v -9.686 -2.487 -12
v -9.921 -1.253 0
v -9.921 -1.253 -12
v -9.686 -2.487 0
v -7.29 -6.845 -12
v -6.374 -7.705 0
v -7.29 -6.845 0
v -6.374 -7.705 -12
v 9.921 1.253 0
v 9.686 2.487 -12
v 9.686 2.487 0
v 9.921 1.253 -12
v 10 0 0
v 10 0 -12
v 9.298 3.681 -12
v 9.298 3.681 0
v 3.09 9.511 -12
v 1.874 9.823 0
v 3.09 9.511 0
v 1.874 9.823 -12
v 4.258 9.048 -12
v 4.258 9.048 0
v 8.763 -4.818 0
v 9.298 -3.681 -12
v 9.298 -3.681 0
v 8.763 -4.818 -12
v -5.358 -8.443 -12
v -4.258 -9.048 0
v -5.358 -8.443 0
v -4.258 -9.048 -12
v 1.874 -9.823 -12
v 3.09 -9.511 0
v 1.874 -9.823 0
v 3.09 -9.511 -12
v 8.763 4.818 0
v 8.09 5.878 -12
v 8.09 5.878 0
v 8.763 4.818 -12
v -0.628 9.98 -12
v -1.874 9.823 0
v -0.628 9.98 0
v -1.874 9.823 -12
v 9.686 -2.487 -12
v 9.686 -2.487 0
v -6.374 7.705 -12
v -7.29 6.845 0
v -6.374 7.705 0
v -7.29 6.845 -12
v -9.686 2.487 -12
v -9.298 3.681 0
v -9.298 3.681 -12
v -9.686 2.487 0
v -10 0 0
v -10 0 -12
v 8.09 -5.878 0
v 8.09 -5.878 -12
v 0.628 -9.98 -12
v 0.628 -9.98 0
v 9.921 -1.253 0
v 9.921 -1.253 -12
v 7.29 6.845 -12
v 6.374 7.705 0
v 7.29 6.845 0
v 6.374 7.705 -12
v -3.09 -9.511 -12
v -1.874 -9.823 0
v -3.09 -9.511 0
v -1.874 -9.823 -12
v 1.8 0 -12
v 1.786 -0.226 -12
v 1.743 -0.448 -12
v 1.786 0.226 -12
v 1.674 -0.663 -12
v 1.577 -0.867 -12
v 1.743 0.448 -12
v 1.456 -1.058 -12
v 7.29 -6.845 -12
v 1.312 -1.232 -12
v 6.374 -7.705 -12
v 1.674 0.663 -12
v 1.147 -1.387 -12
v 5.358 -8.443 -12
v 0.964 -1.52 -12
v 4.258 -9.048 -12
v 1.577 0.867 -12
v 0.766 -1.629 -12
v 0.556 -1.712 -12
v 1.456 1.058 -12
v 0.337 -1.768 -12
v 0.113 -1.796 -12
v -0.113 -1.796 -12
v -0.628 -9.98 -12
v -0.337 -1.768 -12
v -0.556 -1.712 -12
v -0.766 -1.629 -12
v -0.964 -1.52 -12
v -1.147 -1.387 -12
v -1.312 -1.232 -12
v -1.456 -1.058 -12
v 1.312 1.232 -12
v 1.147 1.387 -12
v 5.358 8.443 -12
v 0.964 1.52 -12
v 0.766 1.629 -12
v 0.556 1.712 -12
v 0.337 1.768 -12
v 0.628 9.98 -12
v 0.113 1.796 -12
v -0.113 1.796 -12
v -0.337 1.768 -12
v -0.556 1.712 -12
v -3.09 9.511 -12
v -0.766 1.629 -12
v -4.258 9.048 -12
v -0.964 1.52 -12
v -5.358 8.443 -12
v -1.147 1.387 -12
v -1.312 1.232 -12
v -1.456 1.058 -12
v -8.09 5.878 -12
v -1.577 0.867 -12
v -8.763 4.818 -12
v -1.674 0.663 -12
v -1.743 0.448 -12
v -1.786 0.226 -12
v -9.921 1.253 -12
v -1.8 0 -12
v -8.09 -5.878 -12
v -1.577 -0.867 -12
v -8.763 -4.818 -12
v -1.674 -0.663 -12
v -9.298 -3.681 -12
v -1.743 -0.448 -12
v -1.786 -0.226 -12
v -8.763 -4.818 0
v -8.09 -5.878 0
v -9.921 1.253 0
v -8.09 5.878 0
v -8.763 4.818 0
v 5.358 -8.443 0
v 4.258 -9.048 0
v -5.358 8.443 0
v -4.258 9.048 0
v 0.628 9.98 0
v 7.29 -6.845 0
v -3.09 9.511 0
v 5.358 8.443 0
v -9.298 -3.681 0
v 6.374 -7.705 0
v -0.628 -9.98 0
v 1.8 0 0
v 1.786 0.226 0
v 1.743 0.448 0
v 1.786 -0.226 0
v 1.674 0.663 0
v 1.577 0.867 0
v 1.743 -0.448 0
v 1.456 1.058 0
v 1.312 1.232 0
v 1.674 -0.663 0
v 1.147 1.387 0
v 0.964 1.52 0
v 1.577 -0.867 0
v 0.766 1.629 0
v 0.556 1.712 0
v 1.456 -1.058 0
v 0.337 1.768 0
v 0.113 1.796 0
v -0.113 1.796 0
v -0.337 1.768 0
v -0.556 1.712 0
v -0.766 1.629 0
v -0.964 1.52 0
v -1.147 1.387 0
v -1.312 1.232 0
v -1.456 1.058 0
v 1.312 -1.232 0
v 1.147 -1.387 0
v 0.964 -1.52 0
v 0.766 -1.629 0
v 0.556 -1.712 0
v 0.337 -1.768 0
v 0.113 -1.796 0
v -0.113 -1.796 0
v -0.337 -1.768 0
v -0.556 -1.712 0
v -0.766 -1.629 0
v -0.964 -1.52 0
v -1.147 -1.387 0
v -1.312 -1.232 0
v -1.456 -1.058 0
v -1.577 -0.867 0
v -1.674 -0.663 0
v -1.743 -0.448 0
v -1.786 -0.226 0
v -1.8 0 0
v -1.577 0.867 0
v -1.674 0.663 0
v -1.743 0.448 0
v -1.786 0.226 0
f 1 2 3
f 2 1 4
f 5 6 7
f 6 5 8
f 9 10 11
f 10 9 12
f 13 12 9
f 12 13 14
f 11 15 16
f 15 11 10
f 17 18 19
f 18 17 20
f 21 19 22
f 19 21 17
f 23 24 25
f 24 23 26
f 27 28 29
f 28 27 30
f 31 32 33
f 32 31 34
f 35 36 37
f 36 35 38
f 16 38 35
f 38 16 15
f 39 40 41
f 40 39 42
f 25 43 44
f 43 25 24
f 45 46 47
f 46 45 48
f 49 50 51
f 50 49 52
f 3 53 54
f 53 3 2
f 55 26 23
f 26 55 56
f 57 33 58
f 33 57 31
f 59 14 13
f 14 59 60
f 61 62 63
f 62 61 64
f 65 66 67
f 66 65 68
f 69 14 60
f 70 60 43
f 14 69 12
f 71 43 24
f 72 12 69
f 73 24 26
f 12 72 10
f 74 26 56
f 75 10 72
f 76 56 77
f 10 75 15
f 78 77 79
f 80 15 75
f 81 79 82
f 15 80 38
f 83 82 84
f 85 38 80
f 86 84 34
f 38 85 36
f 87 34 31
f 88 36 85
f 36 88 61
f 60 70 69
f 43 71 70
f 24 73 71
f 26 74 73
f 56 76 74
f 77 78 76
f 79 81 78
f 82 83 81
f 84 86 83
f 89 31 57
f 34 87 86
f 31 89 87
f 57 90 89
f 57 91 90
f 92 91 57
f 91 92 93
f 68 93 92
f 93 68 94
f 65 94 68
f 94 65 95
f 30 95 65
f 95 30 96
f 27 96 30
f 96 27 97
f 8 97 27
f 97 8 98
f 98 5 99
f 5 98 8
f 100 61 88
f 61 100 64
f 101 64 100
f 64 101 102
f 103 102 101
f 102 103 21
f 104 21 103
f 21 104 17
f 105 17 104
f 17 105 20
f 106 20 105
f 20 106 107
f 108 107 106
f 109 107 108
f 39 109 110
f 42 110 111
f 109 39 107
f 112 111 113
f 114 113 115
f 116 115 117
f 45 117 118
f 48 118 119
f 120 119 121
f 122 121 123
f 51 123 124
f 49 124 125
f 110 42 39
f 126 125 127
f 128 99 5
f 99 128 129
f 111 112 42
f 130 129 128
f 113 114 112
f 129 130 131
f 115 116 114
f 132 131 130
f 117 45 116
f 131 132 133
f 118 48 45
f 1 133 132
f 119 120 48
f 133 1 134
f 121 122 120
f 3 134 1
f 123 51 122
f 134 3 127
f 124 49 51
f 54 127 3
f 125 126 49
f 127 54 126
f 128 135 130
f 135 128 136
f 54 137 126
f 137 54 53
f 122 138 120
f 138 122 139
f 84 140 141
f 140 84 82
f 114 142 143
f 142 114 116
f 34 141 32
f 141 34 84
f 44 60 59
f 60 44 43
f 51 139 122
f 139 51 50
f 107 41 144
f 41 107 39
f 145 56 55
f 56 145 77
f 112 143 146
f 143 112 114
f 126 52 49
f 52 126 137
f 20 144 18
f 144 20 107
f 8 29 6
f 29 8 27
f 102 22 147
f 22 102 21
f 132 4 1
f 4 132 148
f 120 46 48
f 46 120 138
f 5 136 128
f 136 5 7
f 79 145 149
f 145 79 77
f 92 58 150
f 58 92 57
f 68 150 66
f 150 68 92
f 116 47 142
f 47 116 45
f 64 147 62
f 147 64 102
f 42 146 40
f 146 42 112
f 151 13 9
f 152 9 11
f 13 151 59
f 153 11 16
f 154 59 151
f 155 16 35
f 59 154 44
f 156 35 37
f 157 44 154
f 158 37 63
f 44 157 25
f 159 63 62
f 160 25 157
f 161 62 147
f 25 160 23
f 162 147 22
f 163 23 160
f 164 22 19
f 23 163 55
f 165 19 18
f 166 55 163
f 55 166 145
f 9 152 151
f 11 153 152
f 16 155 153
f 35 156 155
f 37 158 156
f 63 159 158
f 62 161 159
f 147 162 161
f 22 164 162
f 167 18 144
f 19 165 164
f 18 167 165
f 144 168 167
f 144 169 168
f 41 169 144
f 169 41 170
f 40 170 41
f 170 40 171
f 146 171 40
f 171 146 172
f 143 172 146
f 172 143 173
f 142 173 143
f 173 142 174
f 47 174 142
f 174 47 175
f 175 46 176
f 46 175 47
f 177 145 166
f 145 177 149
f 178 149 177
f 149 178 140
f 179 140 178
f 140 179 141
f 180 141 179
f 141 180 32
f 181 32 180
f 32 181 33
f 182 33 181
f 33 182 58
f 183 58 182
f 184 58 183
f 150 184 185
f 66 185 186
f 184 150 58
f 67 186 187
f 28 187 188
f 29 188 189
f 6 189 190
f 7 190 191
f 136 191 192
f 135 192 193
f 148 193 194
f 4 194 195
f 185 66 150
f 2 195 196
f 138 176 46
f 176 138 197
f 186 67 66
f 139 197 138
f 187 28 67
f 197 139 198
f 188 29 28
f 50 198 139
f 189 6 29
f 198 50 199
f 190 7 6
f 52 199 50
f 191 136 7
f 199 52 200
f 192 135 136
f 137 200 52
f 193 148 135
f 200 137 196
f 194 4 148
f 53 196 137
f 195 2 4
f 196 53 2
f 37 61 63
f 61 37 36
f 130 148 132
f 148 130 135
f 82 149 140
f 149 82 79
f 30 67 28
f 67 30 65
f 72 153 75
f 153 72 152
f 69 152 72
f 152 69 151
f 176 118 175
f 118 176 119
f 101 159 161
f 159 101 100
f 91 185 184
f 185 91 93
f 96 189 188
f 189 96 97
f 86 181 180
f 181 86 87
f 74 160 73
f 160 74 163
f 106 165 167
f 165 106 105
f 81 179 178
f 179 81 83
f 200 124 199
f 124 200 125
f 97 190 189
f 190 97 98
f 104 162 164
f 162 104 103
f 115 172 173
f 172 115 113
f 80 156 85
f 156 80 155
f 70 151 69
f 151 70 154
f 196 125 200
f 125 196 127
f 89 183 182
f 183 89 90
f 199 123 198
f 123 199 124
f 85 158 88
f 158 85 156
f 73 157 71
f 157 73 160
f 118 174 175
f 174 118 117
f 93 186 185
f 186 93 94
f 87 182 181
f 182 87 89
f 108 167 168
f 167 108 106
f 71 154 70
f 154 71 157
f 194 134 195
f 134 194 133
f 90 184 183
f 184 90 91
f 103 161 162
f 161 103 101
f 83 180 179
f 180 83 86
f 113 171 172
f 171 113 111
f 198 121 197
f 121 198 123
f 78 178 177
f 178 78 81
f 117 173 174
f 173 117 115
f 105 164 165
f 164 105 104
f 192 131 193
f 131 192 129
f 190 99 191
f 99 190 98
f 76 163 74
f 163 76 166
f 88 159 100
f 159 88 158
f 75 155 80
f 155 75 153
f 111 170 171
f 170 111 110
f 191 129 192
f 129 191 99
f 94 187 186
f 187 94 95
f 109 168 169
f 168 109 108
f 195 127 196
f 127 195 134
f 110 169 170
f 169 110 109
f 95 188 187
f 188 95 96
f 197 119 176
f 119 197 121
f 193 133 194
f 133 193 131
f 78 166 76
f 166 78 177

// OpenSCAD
$fn = 50;


difference() {
	union() {
		translate(v = [0, 0, -12.0000000000]) {
			cylinder(h = 12, r = 10.0000000000);
		}
		cylinder(h = 0, r = 13.0000000000);
	}
	union() {
		#translate(v = [0, 0, -12]) {
			cylinder(h = 12, r = 1.8000000000);
		}
	}
}
